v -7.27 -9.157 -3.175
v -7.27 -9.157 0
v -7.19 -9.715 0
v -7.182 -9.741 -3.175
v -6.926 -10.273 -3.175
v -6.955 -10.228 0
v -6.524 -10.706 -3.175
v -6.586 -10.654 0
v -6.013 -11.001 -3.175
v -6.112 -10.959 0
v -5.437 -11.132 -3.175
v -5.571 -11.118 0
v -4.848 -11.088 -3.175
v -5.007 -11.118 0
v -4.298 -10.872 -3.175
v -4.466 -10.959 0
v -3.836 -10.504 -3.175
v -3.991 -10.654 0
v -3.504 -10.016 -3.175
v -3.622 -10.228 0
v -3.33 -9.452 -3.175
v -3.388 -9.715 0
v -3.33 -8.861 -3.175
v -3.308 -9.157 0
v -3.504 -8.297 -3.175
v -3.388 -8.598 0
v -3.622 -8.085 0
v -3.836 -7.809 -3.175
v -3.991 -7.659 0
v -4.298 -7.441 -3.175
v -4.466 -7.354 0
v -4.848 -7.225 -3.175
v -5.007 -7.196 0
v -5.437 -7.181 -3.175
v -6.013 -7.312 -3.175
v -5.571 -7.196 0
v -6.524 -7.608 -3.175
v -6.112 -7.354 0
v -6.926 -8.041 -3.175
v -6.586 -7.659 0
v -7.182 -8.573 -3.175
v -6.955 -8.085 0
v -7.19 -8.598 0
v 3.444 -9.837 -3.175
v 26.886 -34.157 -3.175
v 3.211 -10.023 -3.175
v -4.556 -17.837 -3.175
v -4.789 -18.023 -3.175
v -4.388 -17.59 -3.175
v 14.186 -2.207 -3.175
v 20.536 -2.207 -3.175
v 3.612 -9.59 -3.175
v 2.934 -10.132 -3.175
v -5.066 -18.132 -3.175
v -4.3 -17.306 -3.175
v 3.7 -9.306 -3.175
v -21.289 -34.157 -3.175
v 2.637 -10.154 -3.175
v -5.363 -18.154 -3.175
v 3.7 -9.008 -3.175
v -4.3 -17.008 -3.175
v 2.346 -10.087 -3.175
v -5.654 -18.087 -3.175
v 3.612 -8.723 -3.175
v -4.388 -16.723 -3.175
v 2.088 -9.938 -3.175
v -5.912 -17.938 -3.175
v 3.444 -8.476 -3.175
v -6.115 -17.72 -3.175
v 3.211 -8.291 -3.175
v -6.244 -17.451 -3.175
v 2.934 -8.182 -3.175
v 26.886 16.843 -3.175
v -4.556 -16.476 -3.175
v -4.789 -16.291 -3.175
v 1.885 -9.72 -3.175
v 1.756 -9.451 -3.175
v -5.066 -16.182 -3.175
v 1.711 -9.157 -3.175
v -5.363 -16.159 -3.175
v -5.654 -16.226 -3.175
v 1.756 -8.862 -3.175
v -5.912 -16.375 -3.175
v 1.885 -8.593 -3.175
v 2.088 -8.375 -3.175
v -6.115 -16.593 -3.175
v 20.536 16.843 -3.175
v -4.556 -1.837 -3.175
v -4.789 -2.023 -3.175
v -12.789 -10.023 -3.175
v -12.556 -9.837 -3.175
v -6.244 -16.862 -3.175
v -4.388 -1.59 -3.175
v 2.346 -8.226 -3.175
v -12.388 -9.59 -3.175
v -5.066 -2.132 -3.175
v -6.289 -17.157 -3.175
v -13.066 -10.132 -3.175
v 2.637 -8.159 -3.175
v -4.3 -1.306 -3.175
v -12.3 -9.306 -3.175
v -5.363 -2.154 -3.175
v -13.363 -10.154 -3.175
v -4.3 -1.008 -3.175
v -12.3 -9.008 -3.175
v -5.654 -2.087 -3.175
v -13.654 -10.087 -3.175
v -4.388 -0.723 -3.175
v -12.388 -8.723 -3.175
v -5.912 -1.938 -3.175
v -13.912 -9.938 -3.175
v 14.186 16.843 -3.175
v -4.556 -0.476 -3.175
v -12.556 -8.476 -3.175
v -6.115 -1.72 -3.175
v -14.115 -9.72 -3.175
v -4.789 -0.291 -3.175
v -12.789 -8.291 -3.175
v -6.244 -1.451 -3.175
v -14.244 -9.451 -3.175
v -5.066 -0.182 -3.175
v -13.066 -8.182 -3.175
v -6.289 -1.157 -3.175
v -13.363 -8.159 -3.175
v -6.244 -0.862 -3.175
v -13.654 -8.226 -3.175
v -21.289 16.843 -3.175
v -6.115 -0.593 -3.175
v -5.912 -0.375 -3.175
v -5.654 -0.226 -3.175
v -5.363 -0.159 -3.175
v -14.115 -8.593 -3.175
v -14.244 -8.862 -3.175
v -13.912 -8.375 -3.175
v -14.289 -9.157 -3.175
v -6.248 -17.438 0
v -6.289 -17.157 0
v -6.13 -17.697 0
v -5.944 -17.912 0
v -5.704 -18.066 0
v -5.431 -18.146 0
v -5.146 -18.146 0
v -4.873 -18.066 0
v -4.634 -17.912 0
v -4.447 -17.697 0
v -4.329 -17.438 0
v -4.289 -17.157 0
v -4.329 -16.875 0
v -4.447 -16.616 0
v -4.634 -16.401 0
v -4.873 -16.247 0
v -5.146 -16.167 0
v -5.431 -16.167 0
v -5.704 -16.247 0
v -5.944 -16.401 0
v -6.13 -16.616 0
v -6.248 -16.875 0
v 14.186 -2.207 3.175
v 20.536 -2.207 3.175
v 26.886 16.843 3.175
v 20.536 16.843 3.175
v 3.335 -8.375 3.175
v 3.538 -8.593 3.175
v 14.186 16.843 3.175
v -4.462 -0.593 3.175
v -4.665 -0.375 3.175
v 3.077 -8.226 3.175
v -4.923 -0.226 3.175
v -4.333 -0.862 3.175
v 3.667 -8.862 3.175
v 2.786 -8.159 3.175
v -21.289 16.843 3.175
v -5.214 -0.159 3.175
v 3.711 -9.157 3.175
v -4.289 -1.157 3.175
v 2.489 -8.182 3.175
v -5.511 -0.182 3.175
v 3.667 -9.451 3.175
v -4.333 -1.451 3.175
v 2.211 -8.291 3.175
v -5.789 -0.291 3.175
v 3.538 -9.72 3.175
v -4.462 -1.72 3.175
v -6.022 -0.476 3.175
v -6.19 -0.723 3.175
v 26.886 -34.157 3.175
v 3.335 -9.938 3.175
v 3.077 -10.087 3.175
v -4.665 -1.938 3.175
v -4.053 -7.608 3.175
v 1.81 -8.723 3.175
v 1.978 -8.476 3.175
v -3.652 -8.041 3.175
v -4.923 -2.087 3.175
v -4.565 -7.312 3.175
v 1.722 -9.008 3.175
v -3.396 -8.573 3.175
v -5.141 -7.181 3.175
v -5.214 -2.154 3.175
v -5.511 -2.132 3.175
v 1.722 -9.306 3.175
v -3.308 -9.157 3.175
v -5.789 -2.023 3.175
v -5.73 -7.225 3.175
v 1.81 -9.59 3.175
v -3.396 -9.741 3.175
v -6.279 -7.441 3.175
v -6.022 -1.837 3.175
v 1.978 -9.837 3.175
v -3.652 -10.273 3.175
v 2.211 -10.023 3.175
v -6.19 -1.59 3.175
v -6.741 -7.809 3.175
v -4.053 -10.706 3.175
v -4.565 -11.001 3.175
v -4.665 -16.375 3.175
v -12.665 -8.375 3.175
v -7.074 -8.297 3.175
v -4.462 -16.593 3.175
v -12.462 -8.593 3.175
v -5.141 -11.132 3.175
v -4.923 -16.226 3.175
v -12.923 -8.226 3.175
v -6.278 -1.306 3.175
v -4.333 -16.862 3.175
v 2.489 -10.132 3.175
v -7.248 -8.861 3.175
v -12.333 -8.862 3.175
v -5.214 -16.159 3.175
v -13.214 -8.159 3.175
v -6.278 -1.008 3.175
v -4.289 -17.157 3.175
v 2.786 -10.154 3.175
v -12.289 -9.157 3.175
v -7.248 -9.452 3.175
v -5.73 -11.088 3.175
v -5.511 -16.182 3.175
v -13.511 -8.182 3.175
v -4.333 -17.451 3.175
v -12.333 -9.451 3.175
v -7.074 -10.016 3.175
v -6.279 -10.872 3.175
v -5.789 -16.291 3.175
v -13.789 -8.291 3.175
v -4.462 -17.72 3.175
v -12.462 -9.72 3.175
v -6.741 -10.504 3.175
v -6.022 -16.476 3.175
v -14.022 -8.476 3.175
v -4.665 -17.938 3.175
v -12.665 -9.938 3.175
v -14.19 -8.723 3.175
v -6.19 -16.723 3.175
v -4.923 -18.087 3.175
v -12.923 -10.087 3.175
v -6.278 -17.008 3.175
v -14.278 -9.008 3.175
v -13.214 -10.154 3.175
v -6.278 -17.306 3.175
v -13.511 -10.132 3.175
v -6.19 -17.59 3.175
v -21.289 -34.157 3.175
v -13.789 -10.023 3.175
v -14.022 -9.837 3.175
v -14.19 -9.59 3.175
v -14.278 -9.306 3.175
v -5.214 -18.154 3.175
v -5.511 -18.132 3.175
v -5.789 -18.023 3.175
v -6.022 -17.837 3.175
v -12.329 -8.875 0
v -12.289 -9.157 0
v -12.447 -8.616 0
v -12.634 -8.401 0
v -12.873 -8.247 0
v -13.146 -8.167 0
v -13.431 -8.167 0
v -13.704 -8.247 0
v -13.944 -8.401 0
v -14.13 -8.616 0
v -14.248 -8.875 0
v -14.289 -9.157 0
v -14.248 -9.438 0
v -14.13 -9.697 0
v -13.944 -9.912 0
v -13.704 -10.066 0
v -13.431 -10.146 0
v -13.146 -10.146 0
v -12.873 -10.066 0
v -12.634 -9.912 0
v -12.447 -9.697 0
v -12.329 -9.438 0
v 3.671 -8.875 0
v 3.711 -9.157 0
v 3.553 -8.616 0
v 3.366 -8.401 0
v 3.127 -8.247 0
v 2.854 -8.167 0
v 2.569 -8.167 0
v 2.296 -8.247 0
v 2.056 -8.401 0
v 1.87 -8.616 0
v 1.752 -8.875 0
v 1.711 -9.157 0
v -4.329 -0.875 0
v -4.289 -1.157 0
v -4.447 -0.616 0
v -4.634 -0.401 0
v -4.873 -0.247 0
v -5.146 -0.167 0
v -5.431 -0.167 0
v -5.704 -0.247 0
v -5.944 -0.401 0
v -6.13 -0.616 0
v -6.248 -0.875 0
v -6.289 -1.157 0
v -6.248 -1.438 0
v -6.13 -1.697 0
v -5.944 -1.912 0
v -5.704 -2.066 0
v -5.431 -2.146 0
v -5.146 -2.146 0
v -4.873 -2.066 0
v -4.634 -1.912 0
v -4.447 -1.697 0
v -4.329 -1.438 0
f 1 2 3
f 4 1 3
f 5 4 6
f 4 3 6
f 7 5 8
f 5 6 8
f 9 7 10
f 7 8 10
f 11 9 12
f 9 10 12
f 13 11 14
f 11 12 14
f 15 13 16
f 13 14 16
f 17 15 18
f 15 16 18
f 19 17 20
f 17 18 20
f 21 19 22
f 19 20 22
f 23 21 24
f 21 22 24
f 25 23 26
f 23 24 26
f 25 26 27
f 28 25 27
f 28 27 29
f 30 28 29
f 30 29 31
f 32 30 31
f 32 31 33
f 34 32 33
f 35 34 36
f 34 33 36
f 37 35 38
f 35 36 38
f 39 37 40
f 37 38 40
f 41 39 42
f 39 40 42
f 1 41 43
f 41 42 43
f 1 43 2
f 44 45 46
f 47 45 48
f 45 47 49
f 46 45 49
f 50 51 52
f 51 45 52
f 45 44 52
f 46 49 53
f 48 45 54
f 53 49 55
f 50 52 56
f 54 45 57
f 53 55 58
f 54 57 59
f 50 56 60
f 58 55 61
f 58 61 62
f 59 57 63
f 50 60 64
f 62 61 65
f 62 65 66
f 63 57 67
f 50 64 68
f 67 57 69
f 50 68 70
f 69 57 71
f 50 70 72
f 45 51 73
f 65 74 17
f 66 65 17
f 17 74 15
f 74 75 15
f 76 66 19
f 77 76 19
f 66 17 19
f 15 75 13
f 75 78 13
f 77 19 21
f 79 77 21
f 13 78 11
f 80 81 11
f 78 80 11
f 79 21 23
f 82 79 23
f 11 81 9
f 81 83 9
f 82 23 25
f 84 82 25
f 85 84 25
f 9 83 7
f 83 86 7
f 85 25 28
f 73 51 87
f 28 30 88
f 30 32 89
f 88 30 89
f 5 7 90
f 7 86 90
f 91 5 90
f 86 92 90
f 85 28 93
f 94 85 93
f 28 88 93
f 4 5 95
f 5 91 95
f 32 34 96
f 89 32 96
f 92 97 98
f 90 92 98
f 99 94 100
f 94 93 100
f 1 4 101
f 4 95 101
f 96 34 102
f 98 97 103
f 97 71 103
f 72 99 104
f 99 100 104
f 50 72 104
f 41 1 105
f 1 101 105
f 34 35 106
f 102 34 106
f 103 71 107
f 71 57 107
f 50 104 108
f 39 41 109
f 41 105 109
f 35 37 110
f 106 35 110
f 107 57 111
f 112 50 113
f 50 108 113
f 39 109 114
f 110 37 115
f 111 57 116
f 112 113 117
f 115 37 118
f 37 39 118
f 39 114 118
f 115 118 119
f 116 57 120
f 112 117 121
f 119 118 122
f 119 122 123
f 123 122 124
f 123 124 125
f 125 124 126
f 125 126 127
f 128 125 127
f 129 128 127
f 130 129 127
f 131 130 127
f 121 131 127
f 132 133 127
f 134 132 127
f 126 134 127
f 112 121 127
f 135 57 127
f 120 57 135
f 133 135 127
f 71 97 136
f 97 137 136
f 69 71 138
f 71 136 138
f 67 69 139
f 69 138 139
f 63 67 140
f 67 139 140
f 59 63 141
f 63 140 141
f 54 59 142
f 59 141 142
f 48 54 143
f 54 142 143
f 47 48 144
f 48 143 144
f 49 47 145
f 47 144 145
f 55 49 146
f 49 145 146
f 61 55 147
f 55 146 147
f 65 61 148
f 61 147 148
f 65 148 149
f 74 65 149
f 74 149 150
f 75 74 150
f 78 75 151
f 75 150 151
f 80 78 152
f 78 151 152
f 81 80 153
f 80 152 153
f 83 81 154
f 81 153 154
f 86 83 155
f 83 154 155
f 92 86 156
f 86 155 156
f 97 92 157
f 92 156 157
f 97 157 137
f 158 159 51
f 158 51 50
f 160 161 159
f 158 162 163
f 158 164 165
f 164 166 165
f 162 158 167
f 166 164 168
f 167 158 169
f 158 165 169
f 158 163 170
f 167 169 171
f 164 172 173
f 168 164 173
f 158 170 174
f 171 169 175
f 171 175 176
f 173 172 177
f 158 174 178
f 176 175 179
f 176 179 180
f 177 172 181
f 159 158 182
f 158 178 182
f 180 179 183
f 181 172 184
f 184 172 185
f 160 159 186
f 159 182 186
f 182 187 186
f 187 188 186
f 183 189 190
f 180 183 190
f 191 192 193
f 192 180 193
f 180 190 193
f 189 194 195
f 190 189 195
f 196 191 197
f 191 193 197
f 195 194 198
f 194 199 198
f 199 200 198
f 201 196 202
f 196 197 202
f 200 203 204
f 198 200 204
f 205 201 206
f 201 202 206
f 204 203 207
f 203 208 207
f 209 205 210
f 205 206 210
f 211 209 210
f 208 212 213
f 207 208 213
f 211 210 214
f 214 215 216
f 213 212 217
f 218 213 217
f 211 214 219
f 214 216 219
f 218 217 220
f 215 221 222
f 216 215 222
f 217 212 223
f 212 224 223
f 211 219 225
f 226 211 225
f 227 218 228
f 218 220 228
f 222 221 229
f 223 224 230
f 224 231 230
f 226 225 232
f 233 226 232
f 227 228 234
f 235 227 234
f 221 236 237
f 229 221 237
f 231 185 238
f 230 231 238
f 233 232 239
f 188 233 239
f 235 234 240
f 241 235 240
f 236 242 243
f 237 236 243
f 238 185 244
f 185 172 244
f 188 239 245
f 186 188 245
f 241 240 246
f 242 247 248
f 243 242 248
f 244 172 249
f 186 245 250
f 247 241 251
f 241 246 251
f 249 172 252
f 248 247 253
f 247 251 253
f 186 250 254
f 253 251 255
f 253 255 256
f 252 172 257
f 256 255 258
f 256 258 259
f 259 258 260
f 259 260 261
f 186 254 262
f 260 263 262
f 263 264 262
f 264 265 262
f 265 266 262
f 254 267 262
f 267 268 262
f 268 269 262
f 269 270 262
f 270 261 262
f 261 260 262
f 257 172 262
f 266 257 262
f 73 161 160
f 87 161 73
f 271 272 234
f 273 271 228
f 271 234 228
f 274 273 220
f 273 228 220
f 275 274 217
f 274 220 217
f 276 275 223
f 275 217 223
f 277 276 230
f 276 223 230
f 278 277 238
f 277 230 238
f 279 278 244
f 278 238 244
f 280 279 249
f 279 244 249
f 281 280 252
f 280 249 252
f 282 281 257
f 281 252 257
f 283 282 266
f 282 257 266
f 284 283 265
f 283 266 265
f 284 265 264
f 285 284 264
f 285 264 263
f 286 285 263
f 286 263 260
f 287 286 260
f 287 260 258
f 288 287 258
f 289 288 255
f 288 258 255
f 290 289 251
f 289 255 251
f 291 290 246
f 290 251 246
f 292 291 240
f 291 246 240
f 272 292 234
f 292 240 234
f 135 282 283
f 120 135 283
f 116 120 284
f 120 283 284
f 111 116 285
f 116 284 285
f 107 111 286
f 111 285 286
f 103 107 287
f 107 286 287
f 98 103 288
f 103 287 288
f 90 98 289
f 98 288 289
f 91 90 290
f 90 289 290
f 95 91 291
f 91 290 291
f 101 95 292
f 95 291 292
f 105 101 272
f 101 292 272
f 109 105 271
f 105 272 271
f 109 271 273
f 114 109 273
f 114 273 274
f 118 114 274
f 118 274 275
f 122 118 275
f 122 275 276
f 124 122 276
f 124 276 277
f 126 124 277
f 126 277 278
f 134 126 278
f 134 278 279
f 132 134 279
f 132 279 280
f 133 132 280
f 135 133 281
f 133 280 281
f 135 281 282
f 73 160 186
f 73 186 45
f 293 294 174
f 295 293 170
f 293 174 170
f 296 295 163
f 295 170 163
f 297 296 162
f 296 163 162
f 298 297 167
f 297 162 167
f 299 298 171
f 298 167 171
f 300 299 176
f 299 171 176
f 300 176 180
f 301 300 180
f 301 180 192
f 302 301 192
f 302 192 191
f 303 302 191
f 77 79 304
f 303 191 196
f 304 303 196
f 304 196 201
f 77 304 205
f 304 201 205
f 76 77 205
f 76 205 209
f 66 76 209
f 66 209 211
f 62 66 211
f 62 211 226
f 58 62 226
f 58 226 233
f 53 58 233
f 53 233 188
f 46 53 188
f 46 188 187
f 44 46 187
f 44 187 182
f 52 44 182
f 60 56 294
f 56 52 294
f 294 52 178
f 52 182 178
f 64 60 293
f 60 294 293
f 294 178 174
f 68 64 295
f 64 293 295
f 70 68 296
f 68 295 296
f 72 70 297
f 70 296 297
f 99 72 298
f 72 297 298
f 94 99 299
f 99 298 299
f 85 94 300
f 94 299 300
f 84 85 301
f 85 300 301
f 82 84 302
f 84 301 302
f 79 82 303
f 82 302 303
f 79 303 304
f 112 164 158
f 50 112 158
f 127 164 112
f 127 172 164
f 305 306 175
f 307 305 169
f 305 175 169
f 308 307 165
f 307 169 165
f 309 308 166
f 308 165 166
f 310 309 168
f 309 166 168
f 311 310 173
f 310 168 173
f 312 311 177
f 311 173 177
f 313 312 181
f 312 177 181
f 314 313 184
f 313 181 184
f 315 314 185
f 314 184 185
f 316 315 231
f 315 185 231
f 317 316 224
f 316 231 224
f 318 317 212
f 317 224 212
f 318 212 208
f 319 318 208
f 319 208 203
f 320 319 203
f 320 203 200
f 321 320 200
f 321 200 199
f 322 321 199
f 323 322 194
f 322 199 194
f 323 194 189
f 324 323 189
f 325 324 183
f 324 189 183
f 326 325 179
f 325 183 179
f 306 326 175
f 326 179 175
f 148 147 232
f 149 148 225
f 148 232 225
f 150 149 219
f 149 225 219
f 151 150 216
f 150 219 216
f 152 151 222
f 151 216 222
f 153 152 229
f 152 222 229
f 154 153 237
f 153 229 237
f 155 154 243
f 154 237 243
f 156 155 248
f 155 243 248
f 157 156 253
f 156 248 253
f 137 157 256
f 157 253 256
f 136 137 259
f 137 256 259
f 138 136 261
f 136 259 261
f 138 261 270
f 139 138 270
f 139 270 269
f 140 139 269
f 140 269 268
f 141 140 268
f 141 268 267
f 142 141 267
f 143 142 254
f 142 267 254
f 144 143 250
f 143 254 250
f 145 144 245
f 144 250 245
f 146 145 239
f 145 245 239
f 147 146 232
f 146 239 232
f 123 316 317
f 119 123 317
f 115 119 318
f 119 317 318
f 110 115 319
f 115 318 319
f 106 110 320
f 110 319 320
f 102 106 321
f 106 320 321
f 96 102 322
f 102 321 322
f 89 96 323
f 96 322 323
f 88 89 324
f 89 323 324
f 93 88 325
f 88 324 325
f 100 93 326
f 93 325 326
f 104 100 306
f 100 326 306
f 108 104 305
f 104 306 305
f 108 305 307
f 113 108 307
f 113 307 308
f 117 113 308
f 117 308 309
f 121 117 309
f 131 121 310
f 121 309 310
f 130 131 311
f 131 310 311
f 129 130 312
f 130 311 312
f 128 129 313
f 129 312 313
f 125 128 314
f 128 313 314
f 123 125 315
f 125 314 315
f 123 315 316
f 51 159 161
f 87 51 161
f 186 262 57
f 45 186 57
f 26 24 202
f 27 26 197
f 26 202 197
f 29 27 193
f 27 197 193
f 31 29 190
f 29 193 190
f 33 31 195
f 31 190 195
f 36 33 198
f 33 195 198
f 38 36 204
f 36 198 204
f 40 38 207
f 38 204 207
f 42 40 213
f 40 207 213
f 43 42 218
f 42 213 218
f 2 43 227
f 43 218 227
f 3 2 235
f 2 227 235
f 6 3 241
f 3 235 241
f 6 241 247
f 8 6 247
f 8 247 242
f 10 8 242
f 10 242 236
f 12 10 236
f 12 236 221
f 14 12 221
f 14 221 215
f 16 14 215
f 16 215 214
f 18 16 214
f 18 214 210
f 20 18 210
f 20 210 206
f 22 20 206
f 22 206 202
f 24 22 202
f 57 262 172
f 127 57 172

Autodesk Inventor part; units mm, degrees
ref_plane "YZ Plane" through (0, 0, 0) normal (1, 0, 0) x (0, 1, 0)
ref_plane "XZ Plane" through (0, 0, 0) normal (0, 1, 0) x (-1, 0, 0)
ref_plane "XY Plane" through (0, 0, 0) normal (0, 0, 1) x (1, 0, 0)
sketch "Sketch1" plane through (0, 0, 0) normal (0, 0, 1) x (1, 0, 0)
  line L0 (-21.2887, 16.8434) -> (23.7113, 16.8434)
  line L1 (23.7113, 16.8434) -> (23.7113, -34.1566)
  line L2 (23.7113, -34.1566) -> (-21.2887, -34.1566)
  line L3 (-21.2887, -34.1566) -> (-21.2887, 16.8434)
  point P0 (0, 0)
  dimension "d0" = 45
  dimension "d1" = 51
extrude "Extrusion1" add sketch "Sketch1" along normal blind 3.175
sketch "Sketch2" plane through (0, 0, 3.175) normal (0, 0, 1) x (1, 0, 0)
  line L0 (-21.2887, -34.1566) -> (-21.2887, 16.8434) projected
  line L1 (-21.2887, -34.1566) -> (-21.2887, -9.1566)
  circle A0 centre (-5.2887, -9.1566) radius 8
  circle A1 centre (-13.2887, -9.1566) radius 1
  circle A2 centre (-5.2887, -1.1566) radius 1
  circle A3 centre (2.7113, -9.1566) radius 1
  circle A4 centre (-5.2887, -17.1566) radius 1
  point P0 (0, 0)
  dimension "d4" = 25
  dimension "d6" = 16
  dimension "d7" = 2
  dimension "d8" = 2
  dimension "d9" = 2
  dimension "d10" = 2
  dimension "d11" = 16
extrude "Extrusion2" cut sketch "Sketch2" against normal blind 25.4 contours A0 A3 | A0 A3 | A2 A0 | A0 A2 | A4 A0 | A0 A4 | A1 A0 | A0 A1
sketch "Sketch3" plane through (0, 0, 3.175) normal (0, 0, 1) x (1, 0, 0)
  circle A0 centre (-5.2887, -9.1566) radius 1.9812
  point P0 (0, 0)
  dimension "d14" = 3.9624
extrude "Extrusion3" cut sketch "Sketch3" against normal blind 25.4
sketch "Sketch4" plane through (0, 0, 0) normal (0, 0, -1) x (-1, 0, 0)
  circle A0 centre (5.2887, -9.1566) radius 1.9812 projected
  circle A1 centre (5.2887, -17.1566) radius 1 projected
  circle A2 centre (13.2887, -9.1566) radius 1 projected
  circle A3 centre (5.2887, -1.1566) radius 1 projected
  circle A4 centre (-2.7113, -9.1566) radius 1 projected
  line L0 (21.2887, 16.8434) -> (-23.7113, 16.8434) projected
  line L1 (-23.7113, 16.8434) -> (-23.7113, -34.1566) projected
  line L2 (-23.7113, -34.1566) -> (21.2887, -34.1566) projected
  line L3 (21.2887, -34.1566) -> (21.2887, 16.8434) projected
  line L4 (-23.7113, -34.1566) -> (-17.3613, -34.1566)
  point P0 (0, 0)
  dimension "d17" = 6.35
extrude "Extrusion4" add sketch "Sketch4" along normal blind 3.175
sketch "Sketch5" plane through (23.7113, -34.1566, 3.175) normal (1, 0, 0) x (0, 0, -1)
  line L0 (0, 51) -> (0, 0) projected
  line L1 (0, 0) -> (6.35, 0) projected
  line L2 (6.35, 0) -> (6.35, 51) projected
  line L3 (0, 51) -> (6.35, 51) projected
  point P0 (3.175, 34.1566)
extrude "Extrusion5" add sketch "Sketch5" along normal blind 3.175
sketch "Sketch6" plane through (0, 0, 3.175) normal (0, 0, 1) x (1, 0, 0)
  line L0 (-21.2887, 16.8434) -> (26.8863, 16.8434) projected
  line L1 (26.8863, 16.8434) -> (20.5363, 16.8434)
  line L2 (20.5363, 16.8434) -> (14.1863, 16.8434)
  line L3 (14.1863, 16.8434) -> (14.1863, 4.1434)
  line L4 (14.1863, 4.1434) -> (20.5363, 4.1434)
  line L5 (20.5363, 4.1434) -> (20.5363, 16.8434)
  line L6 (14.1863, 4.1434) -> (20.5363, 4.1434)
  line L7 (20.5363, 4.1434) -> (20.5363, -2.2066)
  line L8 (20.5363, -2.2066) -> (14.1863, -2.2066)
  line L9 (14.1863, -2.2066) -> (14.1863, 4.1434)
  point P0 (0, 0)
  dimension "d22" = 6.35
  dimension "d23" = 6.35
  dimension "d24" = 12.7
  dimension "d25" = 6.35
extrude "Extrusion6" cut sketch "Sketch6" against normal blind 25.4
properties part number "sidebasehole"
